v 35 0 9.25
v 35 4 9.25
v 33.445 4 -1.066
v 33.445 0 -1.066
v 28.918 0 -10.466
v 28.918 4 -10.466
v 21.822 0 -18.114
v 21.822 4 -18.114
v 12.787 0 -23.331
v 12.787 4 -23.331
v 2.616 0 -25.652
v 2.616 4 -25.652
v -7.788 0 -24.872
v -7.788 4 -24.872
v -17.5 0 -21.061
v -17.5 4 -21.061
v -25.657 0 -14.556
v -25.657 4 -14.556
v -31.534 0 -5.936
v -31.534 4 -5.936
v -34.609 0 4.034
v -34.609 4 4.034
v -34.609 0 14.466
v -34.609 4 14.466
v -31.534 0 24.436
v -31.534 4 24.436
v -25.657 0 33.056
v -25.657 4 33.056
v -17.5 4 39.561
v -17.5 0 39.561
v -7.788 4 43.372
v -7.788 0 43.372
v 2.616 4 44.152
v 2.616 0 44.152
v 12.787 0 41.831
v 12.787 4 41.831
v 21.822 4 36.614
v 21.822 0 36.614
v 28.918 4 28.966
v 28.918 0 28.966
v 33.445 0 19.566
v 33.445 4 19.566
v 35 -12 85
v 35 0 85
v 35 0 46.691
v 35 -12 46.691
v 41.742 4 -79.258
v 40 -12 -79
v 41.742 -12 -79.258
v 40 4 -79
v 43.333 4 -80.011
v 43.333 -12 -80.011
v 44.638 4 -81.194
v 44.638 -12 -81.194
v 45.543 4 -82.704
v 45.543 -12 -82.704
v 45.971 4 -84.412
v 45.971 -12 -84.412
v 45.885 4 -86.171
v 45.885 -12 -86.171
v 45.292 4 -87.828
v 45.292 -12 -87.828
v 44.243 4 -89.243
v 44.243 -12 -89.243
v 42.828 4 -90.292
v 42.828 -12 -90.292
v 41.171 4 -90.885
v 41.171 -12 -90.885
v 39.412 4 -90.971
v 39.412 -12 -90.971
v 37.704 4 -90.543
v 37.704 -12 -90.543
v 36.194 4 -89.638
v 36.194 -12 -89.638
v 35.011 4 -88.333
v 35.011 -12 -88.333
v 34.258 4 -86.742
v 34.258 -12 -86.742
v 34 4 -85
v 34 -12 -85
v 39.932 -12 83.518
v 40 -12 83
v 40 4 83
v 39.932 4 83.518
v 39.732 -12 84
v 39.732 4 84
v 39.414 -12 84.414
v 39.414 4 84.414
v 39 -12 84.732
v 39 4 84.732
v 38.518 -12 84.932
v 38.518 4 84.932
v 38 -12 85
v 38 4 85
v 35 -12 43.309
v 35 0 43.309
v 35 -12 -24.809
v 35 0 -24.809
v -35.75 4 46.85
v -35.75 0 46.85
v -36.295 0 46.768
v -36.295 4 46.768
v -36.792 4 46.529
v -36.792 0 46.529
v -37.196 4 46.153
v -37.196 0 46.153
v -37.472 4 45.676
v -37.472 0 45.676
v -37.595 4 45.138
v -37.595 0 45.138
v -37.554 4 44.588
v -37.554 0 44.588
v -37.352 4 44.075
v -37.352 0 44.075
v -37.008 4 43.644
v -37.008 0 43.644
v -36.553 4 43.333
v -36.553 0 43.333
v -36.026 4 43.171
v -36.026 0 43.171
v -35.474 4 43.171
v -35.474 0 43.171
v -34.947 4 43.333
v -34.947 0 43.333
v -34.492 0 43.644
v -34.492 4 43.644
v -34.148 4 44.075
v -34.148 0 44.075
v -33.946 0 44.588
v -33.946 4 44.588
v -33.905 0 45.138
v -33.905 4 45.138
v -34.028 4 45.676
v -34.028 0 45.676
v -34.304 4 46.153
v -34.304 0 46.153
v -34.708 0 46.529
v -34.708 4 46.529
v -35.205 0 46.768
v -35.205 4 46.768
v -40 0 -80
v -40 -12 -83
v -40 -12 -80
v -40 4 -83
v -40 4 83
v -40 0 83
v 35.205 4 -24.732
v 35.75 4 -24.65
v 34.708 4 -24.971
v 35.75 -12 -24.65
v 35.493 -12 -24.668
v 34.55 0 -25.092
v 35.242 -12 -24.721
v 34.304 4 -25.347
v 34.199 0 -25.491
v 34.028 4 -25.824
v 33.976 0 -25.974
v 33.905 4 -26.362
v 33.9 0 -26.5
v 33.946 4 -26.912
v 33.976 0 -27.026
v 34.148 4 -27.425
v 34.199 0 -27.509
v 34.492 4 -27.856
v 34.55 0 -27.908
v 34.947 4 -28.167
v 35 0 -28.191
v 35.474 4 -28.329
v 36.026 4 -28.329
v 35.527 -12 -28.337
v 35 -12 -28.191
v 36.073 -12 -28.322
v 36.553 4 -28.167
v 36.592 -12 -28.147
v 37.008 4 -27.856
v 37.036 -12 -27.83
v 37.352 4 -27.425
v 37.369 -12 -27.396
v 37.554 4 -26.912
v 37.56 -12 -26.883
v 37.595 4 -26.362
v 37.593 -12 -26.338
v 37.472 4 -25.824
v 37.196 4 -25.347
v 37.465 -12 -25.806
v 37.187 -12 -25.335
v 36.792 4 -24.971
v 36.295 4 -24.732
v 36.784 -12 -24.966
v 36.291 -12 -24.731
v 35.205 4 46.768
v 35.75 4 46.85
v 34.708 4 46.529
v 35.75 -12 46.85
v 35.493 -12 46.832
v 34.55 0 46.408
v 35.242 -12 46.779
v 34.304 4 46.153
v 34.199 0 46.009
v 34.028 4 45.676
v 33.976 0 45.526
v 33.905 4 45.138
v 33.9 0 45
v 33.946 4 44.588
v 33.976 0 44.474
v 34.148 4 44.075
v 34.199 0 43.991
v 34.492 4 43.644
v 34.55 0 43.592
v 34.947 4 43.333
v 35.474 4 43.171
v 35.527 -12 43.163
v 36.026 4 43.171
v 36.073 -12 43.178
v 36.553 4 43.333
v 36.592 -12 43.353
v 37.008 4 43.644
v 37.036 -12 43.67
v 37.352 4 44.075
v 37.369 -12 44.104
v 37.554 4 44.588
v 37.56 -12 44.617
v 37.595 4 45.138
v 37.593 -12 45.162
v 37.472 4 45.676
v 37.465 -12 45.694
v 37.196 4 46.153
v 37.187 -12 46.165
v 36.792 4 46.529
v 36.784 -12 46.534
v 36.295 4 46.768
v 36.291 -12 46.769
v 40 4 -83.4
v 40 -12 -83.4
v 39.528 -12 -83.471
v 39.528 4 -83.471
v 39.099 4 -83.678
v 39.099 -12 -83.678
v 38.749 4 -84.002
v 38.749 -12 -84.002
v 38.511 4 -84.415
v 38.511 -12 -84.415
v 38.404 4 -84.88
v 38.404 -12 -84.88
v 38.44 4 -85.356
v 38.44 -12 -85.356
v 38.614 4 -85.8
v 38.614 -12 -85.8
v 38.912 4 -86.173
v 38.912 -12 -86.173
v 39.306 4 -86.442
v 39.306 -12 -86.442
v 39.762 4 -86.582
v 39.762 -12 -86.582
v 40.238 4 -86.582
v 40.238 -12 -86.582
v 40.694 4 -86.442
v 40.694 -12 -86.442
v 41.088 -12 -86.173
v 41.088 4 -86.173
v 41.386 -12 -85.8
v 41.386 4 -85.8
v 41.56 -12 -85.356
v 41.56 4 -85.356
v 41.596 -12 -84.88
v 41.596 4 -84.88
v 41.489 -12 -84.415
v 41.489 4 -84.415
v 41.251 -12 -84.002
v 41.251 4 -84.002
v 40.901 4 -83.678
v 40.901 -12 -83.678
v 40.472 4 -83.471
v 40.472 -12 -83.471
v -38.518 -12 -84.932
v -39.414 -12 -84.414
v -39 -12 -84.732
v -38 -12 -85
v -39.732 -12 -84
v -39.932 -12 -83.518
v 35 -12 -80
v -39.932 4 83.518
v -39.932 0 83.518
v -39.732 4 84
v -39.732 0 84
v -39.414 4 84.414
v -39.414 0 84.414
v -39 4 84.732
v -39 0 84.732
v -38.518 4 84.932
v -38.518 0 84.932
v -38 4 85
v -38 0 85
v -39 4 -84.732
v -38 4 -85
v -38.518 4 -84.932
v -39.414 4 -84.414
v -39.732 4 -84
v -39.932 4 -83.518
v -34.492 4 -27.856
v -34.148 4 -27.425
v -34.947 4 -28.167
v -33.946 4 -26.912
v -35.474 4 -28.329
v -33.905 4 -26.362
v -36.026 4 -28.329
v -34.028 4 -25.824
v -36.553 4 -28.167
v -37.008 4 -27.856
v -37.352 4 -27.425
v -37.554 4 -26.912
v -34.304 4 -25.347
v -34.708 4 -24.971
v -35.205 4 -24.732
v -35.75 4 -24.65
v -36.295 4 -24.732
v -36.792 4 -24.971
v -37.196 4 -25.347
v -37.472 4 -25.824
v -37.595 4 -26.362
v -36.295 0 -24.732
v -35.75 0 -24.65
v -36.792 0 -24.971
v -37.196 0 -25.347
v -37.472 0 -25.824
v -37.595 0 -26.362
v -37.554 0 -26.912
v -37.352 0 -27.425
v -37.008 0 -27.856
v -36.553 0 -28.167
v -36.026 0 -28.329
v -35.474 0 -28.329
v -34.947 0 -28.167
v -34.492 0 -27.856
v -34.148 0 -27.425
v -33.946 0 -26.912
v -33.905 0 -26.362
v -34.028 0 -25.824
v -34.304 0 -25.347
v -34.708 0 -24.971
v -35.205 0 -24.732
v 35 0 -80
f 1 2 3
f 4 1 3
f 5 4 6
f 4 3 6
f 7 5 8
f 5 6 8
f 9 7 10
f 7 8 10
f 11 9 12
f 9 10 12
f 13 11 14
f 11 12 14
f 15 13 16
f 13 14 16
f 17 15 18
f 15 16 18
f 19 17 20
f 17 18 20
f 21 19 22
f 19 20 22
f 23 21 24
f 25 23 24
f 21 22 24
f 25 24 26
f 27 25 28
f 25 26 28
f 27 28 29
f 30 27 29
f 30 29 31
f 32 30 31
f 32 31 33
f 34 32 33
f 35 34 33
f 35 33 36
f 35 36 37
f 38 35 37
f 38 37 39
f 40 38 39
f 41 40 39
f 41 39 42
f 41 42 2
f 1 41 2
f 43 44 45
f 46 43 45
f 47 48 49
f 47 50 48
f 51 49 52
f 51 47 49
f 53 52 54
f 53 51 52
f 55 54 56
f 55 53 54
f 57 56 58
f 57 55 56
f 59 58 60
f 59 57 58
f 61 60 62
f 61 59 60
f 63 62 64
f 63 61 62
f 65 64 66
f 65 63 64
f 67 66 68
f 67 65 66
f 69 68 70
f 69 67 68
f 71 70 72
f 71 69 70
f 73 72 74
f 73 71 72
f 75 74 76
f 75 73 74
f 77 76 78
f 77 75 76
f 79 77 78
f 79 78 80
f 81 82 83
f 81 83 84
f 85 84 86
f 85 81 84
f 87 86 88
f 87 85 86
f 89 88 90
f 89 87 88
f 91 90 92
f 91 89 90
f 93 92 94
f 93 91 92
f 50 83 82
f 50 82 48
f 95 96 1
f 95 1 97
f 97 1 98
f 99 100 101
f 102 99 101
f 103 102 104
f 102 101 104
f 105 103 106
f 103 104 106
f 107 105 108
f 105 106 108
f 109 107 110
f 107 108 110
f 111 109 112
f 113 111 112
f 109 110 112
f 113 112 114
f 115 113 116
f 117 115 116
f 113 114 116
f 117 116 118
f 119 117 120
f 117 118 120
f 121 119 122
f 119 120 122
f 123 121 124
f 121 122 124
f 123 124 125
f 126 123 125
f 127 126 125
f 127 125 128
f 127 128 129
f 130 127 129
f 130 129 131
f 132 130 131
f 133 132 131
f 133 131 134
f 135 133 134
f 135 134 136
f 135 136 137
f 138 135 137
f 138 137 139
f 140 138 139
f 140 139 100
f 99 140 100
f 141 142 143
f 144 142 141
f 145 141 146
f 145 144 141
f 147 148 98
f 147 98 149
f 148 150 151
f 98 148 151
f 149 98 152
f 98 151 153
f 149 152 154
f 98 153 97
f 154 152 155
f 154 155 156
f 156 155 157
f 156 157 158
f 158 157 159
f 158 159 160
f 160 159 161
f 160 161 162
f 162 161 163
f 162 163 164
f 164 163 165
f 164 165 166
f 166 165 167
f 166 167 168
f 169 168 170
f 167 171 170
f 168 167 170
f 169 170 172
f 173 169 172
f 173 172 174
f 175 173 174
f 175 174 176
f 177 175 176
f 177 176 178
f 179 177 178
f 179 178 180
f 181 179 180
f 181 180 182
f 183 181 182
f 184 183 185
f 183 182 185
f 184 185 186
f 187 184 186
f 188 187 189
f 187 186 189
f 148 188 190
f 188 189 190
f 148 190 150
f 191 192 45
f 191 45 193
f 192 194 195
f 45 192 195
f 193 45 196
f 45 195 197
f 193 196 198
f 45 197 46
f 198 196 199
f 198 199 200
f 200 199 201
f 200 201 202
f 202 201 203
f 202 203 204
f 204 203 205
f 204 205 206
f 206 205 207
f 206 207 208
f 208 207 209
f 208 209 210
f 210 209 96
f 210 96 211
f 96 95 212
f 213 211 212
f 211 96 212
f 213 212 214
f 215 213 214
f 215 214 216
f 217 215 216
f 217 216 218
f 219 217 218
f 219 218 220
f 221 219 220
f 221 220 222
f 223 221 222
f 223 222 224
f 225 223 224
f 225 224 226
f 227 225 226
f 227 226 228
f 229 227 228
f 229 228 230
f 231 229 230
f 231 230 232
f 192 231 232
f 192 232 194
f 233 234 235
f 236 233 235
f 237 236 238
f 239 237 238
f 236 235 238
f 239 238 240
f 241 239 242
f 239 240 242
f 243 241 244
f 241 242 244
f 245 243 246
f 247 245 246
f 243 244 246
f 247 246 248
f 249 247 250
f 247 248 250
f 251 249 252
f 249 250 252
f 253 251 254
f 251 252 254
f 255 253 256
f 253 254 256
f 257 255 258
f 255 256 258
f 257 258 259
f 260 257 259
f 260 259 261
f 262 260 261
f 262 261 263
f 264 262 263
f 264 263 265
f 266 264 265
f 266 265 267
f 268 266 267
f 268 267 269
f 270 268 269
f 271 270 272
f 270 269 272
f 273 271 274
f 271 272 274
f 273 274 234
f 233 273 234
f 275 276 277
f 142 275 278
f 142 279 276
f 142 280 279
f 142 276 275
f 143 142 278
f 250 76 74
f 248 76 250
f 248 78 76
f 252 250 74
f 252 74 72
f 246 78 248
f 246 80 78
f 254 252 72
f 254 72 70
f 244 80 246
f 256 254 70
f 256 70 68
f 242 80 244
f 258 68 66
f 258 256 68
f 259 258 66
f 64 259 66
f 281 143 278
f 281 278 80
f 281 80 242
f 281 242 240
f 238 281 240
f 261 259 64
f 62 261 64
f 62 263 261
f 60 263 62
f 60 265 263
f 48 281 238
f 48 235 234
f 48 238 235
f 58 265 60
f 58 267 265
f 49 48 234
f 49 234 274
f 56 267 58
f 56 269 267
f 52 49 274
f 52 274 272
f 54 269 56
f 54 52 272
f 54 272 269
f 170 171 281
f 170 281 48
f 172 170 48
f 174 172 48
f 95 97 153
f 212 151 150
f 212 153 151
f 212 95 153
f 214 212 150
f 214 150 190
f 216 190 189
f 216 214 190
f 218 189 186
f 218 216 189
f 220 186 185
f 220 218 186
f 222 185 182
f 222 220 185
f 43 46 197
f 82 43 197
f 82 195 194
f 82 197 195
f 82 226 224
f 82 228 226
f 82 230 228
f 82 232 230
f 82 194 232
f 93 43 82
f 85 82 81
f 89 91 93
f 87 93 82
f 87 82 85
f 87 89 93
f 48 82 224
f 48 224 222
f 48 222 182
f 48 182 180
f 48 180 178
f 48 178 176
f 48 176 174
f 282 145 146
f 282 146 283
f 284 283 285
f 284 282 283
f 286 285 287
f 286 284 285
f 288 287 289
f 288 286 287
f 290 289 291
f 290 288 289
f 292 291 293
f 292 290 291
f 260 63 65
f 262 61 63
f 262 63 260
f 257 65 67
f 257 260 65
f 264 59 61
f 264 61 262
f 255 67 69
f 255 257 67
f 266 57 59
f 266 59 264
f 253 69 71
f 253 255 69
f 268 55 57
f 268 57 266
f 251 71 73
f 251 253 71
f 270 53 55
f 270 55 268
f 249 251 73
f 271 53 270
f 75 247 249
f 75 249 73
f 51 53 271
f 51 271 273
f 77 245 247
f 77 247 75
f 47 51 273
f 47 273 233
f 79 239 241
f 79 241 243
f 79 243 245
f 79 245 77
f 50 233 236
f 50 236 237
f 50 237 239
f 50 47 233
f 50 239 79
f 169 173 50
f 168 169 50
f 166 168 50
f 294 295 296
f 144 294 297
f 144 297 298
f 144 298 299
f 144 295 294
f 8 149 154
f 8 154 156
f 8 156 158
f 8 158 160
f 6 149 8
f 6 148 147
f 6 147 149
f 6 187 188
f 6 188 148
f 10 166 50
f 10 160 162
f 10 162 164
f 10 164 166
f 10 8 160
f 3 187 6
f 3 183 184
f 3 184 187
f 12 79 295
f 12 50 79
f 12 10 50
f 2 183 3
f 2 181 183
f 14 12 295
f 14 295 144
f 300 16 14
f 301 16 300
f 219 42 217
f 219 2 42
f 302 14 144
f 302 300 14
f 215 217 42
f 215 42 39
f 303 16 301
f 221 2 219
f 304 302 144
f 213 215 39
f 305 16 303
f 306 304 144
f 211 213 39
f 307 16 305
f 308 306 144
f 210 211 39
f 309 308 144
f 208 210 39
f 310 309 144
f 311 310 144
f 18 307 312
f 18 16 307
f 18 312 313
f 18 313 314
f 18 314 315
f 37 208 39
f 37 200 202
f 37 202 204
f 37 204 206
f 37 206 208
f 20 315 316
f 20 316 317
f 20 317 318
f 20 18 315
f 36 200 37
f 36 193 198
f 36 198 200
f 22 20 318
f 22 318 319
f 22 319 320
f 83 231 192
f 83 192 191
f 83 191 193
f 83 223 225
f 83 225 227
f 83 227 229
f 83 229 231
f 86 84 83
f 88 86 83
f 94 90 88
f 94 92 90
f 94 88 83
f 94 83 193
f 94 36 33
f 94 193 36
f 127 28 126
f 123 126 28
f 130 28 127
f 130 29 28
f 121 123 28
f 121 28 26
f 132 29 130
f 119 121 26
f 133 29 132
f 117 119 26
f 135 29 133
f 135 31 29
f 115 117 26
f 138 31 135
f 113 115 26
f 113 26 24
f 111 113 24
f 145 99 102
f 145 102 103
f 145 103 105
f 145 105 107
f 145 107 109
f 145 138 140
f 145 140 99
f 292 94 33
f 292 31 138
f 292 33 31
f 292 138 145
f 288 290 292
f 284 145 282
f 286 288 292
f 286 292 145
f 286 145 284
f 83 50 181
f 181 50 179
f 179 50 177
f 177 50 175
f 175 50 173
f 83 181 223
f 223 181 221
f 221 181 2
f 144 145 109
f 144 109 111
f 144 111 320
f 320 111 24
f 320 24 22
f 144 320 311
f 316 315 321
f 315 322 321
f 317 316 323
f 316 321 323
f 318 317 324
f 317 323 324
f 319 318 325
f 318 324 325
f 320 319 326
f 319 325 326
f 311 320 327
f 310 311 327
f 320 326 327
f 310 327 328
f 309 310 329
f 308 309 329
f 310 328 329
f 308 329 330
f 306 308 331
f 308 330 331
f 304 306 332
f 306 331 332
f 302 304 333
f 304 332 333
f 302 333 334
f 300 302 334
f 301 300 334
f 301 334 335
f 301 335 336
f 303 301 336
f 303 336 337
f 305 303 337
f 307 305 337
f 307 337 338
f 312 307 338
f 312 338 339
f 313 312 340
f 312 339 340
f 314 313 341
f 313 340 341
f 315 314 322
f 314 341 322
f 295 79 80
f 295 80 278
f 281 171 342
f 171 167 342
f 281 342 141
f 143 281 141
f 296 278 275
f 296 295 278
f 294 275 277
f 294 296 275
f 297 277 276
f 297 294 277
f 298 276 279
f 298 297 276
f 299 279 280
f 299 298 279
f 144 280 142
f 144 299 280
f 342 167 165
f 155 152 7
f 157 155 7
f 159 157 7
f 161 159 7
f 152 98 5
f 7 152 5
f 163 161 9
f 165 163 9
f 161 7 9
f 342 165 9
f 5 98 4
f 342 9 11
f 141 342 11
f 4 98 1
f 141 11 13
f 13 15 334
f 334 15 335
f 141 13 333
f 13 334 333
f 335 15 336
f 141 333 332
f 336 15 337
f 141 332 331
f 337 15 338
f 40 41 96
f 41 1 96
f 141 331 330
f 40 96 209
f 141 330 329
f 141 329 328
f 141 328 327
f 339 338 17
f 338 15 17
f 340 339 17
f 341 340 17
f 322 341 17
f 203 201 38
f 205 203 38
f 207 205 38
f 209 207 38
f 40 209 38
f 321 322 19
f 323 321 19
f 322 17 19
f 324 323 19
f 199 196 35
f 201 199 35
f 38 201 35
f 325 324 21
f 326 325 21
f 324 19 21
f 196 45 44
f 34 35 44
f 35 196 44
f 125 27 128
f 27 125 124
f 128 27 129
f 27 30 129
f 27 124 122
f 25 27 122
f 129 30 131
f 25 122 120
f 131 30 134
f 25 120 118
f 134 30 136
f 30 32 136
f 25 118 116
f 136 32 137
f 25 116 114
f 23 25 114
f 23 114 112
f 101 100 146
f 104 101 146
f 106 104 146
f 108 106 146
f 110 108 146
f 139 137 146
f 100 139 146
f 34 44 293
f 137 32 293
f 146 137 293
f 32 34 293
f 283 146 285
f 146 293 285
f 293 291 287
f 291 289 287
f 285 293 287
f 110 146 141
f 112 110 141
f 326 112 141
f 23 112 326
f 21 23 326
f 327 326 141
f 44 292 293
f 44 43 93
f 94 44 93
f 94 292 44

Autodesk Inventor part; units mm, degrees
ref_plane "YZ Plane" through (0, 0, 0) normal (1, 0, 0) x (0, 1, 0)
ref_plane "XZ Plane" through (0, 0, 0) normal (0, 1, 0) x (-1, 0, 0)
ref_plane "XY Plane" through (0, 0, 0) normal (0, 0, 1) x (1, 0, 0)
sketch "Sketch1" plane through (0, 0, 0) normal (0, 1, 0) x (-1, 0, 0)
  line L0 (40, 85) -> (-40, 85)
  line L1 (-40, 85) -> (-40, -85)
  line L2 (-40, -85) -> (40, -85)
  line L3 (40, -85) -> (40, 85)
  line L4 (40, 85) -> (-40, -85) construction
  line L5 (-40, 85) -> (40, -85) construction
  circle A0 centre (-40, -85) radius 6
  point P0 (0, 0)
  point P1 (-40, -79)
  point P2 (-34, -85)
  dimension "d0" = 80
  dimension "d1" = 170
  dimension "d2" = 12
extrude "Extrusion1" add sketch "Sketch1" along normal blind 4
sketch "Sketch2" plane through (0, 0, 0) normal (0, -1, 0) x (1, 0, 0)
  line L0 (40, 85) -> (40, -79) projected
  line L1 (-40, 85) -> (40, 85) projected
  line L2 (-40, -85) -> (-40, 85) projected
  line L3 (34, -85) -> (-40, -85) projected
  arc A0 (34, -85) -> (40, -79) centre (40, -85) ccw projected
  line L4 (35, 85) -> (35, -80)
  line L5 (35, -80) -> (-40, -80)
  point P0 (0, 0)
  dimension "d5" = 5
  dimension "d6" = 5
extrude "Extrusion2" add sketch "Sketch2" along normal blind 12 contours L0 A0 L3 L2 L5 L4 L1
sketch "Sketch3" plane through (0, 4, 0) normal (0, 1, 0) x (1, 0, 0)
  arc A0 (40, 79) -> (34, 85) centre (40, 85) ccw projected
  arc A1 (40, 79) -> (34, 85) centre (40, 85) ccw projected
  point P0 (0, 0)
hole "Hole1" at (40, 4, -85) direction (0, -1, 0) diameter 3.2 end through all
sketch "Sketch4" plane through (0, 4, 0) normal (0, 1, 0) x (1, 0, 0)
  line L0 (35.75, -45) -> (-35.75, -45) construction
  line L1 (-35.75, -45) -> (-35.75, 26.5) construction
  line L2 (-35.75, 26.5) -> (35.75, 26.5) construction
  line L3 (35.75, 26.5) -> (35.75, -45) construction
  line L4 (35.75, -45) -> (-35.75, 26.5) construction
  line L5 (-35.75, -45) -> (35.75, 26.5) construction
  circle A0 centre (40, 85) radius 1.6 projected
  line L6 (40, -85) -> (40, 79) projected
  arc A1 (40, 79) -> (34, 85) centre (40, 85) ccw projected
  line L7 (34, 85) -> (-40, 85) projected
  line L8 (-40, 85) -> (-40, -85) projected
  line L9 (-40, -85) -> (40, -85) projected
  point P0 (0, 0)
  point P1 (0, -9.25)
  dimension "d16" = 71.5
  dimension "d17" = 40
hole "Hole2" at (-35.75, 4, 45) at (-35.75, 4, -26.5) at (35.75, 4, 45) at (35.75, 4, -26.5) direction (0, -1, 0) diameter 3.7 end through all
sketch "Sketch5" plane through (0, 4, 0) normal (0, 1, 0) x (1, 0, 0)
  circle A0 centre (0, -9.25) radius 35
  point P0 (0, 0)
  point P1 (0, -9.25)
  dimension "d25" = 70
extrude "Extrusion3" cut sketch "Sketch5" against normal up to surface (4 mm away)
fillet "Fillet1" radius 2 3 edges at (-40, -4, -85) (-40, 2, 85) (40, -4, 85)
equation "\"d6\" = d5"
properties part number "Power Box (12V) Cover" material "ABS Plastic"
